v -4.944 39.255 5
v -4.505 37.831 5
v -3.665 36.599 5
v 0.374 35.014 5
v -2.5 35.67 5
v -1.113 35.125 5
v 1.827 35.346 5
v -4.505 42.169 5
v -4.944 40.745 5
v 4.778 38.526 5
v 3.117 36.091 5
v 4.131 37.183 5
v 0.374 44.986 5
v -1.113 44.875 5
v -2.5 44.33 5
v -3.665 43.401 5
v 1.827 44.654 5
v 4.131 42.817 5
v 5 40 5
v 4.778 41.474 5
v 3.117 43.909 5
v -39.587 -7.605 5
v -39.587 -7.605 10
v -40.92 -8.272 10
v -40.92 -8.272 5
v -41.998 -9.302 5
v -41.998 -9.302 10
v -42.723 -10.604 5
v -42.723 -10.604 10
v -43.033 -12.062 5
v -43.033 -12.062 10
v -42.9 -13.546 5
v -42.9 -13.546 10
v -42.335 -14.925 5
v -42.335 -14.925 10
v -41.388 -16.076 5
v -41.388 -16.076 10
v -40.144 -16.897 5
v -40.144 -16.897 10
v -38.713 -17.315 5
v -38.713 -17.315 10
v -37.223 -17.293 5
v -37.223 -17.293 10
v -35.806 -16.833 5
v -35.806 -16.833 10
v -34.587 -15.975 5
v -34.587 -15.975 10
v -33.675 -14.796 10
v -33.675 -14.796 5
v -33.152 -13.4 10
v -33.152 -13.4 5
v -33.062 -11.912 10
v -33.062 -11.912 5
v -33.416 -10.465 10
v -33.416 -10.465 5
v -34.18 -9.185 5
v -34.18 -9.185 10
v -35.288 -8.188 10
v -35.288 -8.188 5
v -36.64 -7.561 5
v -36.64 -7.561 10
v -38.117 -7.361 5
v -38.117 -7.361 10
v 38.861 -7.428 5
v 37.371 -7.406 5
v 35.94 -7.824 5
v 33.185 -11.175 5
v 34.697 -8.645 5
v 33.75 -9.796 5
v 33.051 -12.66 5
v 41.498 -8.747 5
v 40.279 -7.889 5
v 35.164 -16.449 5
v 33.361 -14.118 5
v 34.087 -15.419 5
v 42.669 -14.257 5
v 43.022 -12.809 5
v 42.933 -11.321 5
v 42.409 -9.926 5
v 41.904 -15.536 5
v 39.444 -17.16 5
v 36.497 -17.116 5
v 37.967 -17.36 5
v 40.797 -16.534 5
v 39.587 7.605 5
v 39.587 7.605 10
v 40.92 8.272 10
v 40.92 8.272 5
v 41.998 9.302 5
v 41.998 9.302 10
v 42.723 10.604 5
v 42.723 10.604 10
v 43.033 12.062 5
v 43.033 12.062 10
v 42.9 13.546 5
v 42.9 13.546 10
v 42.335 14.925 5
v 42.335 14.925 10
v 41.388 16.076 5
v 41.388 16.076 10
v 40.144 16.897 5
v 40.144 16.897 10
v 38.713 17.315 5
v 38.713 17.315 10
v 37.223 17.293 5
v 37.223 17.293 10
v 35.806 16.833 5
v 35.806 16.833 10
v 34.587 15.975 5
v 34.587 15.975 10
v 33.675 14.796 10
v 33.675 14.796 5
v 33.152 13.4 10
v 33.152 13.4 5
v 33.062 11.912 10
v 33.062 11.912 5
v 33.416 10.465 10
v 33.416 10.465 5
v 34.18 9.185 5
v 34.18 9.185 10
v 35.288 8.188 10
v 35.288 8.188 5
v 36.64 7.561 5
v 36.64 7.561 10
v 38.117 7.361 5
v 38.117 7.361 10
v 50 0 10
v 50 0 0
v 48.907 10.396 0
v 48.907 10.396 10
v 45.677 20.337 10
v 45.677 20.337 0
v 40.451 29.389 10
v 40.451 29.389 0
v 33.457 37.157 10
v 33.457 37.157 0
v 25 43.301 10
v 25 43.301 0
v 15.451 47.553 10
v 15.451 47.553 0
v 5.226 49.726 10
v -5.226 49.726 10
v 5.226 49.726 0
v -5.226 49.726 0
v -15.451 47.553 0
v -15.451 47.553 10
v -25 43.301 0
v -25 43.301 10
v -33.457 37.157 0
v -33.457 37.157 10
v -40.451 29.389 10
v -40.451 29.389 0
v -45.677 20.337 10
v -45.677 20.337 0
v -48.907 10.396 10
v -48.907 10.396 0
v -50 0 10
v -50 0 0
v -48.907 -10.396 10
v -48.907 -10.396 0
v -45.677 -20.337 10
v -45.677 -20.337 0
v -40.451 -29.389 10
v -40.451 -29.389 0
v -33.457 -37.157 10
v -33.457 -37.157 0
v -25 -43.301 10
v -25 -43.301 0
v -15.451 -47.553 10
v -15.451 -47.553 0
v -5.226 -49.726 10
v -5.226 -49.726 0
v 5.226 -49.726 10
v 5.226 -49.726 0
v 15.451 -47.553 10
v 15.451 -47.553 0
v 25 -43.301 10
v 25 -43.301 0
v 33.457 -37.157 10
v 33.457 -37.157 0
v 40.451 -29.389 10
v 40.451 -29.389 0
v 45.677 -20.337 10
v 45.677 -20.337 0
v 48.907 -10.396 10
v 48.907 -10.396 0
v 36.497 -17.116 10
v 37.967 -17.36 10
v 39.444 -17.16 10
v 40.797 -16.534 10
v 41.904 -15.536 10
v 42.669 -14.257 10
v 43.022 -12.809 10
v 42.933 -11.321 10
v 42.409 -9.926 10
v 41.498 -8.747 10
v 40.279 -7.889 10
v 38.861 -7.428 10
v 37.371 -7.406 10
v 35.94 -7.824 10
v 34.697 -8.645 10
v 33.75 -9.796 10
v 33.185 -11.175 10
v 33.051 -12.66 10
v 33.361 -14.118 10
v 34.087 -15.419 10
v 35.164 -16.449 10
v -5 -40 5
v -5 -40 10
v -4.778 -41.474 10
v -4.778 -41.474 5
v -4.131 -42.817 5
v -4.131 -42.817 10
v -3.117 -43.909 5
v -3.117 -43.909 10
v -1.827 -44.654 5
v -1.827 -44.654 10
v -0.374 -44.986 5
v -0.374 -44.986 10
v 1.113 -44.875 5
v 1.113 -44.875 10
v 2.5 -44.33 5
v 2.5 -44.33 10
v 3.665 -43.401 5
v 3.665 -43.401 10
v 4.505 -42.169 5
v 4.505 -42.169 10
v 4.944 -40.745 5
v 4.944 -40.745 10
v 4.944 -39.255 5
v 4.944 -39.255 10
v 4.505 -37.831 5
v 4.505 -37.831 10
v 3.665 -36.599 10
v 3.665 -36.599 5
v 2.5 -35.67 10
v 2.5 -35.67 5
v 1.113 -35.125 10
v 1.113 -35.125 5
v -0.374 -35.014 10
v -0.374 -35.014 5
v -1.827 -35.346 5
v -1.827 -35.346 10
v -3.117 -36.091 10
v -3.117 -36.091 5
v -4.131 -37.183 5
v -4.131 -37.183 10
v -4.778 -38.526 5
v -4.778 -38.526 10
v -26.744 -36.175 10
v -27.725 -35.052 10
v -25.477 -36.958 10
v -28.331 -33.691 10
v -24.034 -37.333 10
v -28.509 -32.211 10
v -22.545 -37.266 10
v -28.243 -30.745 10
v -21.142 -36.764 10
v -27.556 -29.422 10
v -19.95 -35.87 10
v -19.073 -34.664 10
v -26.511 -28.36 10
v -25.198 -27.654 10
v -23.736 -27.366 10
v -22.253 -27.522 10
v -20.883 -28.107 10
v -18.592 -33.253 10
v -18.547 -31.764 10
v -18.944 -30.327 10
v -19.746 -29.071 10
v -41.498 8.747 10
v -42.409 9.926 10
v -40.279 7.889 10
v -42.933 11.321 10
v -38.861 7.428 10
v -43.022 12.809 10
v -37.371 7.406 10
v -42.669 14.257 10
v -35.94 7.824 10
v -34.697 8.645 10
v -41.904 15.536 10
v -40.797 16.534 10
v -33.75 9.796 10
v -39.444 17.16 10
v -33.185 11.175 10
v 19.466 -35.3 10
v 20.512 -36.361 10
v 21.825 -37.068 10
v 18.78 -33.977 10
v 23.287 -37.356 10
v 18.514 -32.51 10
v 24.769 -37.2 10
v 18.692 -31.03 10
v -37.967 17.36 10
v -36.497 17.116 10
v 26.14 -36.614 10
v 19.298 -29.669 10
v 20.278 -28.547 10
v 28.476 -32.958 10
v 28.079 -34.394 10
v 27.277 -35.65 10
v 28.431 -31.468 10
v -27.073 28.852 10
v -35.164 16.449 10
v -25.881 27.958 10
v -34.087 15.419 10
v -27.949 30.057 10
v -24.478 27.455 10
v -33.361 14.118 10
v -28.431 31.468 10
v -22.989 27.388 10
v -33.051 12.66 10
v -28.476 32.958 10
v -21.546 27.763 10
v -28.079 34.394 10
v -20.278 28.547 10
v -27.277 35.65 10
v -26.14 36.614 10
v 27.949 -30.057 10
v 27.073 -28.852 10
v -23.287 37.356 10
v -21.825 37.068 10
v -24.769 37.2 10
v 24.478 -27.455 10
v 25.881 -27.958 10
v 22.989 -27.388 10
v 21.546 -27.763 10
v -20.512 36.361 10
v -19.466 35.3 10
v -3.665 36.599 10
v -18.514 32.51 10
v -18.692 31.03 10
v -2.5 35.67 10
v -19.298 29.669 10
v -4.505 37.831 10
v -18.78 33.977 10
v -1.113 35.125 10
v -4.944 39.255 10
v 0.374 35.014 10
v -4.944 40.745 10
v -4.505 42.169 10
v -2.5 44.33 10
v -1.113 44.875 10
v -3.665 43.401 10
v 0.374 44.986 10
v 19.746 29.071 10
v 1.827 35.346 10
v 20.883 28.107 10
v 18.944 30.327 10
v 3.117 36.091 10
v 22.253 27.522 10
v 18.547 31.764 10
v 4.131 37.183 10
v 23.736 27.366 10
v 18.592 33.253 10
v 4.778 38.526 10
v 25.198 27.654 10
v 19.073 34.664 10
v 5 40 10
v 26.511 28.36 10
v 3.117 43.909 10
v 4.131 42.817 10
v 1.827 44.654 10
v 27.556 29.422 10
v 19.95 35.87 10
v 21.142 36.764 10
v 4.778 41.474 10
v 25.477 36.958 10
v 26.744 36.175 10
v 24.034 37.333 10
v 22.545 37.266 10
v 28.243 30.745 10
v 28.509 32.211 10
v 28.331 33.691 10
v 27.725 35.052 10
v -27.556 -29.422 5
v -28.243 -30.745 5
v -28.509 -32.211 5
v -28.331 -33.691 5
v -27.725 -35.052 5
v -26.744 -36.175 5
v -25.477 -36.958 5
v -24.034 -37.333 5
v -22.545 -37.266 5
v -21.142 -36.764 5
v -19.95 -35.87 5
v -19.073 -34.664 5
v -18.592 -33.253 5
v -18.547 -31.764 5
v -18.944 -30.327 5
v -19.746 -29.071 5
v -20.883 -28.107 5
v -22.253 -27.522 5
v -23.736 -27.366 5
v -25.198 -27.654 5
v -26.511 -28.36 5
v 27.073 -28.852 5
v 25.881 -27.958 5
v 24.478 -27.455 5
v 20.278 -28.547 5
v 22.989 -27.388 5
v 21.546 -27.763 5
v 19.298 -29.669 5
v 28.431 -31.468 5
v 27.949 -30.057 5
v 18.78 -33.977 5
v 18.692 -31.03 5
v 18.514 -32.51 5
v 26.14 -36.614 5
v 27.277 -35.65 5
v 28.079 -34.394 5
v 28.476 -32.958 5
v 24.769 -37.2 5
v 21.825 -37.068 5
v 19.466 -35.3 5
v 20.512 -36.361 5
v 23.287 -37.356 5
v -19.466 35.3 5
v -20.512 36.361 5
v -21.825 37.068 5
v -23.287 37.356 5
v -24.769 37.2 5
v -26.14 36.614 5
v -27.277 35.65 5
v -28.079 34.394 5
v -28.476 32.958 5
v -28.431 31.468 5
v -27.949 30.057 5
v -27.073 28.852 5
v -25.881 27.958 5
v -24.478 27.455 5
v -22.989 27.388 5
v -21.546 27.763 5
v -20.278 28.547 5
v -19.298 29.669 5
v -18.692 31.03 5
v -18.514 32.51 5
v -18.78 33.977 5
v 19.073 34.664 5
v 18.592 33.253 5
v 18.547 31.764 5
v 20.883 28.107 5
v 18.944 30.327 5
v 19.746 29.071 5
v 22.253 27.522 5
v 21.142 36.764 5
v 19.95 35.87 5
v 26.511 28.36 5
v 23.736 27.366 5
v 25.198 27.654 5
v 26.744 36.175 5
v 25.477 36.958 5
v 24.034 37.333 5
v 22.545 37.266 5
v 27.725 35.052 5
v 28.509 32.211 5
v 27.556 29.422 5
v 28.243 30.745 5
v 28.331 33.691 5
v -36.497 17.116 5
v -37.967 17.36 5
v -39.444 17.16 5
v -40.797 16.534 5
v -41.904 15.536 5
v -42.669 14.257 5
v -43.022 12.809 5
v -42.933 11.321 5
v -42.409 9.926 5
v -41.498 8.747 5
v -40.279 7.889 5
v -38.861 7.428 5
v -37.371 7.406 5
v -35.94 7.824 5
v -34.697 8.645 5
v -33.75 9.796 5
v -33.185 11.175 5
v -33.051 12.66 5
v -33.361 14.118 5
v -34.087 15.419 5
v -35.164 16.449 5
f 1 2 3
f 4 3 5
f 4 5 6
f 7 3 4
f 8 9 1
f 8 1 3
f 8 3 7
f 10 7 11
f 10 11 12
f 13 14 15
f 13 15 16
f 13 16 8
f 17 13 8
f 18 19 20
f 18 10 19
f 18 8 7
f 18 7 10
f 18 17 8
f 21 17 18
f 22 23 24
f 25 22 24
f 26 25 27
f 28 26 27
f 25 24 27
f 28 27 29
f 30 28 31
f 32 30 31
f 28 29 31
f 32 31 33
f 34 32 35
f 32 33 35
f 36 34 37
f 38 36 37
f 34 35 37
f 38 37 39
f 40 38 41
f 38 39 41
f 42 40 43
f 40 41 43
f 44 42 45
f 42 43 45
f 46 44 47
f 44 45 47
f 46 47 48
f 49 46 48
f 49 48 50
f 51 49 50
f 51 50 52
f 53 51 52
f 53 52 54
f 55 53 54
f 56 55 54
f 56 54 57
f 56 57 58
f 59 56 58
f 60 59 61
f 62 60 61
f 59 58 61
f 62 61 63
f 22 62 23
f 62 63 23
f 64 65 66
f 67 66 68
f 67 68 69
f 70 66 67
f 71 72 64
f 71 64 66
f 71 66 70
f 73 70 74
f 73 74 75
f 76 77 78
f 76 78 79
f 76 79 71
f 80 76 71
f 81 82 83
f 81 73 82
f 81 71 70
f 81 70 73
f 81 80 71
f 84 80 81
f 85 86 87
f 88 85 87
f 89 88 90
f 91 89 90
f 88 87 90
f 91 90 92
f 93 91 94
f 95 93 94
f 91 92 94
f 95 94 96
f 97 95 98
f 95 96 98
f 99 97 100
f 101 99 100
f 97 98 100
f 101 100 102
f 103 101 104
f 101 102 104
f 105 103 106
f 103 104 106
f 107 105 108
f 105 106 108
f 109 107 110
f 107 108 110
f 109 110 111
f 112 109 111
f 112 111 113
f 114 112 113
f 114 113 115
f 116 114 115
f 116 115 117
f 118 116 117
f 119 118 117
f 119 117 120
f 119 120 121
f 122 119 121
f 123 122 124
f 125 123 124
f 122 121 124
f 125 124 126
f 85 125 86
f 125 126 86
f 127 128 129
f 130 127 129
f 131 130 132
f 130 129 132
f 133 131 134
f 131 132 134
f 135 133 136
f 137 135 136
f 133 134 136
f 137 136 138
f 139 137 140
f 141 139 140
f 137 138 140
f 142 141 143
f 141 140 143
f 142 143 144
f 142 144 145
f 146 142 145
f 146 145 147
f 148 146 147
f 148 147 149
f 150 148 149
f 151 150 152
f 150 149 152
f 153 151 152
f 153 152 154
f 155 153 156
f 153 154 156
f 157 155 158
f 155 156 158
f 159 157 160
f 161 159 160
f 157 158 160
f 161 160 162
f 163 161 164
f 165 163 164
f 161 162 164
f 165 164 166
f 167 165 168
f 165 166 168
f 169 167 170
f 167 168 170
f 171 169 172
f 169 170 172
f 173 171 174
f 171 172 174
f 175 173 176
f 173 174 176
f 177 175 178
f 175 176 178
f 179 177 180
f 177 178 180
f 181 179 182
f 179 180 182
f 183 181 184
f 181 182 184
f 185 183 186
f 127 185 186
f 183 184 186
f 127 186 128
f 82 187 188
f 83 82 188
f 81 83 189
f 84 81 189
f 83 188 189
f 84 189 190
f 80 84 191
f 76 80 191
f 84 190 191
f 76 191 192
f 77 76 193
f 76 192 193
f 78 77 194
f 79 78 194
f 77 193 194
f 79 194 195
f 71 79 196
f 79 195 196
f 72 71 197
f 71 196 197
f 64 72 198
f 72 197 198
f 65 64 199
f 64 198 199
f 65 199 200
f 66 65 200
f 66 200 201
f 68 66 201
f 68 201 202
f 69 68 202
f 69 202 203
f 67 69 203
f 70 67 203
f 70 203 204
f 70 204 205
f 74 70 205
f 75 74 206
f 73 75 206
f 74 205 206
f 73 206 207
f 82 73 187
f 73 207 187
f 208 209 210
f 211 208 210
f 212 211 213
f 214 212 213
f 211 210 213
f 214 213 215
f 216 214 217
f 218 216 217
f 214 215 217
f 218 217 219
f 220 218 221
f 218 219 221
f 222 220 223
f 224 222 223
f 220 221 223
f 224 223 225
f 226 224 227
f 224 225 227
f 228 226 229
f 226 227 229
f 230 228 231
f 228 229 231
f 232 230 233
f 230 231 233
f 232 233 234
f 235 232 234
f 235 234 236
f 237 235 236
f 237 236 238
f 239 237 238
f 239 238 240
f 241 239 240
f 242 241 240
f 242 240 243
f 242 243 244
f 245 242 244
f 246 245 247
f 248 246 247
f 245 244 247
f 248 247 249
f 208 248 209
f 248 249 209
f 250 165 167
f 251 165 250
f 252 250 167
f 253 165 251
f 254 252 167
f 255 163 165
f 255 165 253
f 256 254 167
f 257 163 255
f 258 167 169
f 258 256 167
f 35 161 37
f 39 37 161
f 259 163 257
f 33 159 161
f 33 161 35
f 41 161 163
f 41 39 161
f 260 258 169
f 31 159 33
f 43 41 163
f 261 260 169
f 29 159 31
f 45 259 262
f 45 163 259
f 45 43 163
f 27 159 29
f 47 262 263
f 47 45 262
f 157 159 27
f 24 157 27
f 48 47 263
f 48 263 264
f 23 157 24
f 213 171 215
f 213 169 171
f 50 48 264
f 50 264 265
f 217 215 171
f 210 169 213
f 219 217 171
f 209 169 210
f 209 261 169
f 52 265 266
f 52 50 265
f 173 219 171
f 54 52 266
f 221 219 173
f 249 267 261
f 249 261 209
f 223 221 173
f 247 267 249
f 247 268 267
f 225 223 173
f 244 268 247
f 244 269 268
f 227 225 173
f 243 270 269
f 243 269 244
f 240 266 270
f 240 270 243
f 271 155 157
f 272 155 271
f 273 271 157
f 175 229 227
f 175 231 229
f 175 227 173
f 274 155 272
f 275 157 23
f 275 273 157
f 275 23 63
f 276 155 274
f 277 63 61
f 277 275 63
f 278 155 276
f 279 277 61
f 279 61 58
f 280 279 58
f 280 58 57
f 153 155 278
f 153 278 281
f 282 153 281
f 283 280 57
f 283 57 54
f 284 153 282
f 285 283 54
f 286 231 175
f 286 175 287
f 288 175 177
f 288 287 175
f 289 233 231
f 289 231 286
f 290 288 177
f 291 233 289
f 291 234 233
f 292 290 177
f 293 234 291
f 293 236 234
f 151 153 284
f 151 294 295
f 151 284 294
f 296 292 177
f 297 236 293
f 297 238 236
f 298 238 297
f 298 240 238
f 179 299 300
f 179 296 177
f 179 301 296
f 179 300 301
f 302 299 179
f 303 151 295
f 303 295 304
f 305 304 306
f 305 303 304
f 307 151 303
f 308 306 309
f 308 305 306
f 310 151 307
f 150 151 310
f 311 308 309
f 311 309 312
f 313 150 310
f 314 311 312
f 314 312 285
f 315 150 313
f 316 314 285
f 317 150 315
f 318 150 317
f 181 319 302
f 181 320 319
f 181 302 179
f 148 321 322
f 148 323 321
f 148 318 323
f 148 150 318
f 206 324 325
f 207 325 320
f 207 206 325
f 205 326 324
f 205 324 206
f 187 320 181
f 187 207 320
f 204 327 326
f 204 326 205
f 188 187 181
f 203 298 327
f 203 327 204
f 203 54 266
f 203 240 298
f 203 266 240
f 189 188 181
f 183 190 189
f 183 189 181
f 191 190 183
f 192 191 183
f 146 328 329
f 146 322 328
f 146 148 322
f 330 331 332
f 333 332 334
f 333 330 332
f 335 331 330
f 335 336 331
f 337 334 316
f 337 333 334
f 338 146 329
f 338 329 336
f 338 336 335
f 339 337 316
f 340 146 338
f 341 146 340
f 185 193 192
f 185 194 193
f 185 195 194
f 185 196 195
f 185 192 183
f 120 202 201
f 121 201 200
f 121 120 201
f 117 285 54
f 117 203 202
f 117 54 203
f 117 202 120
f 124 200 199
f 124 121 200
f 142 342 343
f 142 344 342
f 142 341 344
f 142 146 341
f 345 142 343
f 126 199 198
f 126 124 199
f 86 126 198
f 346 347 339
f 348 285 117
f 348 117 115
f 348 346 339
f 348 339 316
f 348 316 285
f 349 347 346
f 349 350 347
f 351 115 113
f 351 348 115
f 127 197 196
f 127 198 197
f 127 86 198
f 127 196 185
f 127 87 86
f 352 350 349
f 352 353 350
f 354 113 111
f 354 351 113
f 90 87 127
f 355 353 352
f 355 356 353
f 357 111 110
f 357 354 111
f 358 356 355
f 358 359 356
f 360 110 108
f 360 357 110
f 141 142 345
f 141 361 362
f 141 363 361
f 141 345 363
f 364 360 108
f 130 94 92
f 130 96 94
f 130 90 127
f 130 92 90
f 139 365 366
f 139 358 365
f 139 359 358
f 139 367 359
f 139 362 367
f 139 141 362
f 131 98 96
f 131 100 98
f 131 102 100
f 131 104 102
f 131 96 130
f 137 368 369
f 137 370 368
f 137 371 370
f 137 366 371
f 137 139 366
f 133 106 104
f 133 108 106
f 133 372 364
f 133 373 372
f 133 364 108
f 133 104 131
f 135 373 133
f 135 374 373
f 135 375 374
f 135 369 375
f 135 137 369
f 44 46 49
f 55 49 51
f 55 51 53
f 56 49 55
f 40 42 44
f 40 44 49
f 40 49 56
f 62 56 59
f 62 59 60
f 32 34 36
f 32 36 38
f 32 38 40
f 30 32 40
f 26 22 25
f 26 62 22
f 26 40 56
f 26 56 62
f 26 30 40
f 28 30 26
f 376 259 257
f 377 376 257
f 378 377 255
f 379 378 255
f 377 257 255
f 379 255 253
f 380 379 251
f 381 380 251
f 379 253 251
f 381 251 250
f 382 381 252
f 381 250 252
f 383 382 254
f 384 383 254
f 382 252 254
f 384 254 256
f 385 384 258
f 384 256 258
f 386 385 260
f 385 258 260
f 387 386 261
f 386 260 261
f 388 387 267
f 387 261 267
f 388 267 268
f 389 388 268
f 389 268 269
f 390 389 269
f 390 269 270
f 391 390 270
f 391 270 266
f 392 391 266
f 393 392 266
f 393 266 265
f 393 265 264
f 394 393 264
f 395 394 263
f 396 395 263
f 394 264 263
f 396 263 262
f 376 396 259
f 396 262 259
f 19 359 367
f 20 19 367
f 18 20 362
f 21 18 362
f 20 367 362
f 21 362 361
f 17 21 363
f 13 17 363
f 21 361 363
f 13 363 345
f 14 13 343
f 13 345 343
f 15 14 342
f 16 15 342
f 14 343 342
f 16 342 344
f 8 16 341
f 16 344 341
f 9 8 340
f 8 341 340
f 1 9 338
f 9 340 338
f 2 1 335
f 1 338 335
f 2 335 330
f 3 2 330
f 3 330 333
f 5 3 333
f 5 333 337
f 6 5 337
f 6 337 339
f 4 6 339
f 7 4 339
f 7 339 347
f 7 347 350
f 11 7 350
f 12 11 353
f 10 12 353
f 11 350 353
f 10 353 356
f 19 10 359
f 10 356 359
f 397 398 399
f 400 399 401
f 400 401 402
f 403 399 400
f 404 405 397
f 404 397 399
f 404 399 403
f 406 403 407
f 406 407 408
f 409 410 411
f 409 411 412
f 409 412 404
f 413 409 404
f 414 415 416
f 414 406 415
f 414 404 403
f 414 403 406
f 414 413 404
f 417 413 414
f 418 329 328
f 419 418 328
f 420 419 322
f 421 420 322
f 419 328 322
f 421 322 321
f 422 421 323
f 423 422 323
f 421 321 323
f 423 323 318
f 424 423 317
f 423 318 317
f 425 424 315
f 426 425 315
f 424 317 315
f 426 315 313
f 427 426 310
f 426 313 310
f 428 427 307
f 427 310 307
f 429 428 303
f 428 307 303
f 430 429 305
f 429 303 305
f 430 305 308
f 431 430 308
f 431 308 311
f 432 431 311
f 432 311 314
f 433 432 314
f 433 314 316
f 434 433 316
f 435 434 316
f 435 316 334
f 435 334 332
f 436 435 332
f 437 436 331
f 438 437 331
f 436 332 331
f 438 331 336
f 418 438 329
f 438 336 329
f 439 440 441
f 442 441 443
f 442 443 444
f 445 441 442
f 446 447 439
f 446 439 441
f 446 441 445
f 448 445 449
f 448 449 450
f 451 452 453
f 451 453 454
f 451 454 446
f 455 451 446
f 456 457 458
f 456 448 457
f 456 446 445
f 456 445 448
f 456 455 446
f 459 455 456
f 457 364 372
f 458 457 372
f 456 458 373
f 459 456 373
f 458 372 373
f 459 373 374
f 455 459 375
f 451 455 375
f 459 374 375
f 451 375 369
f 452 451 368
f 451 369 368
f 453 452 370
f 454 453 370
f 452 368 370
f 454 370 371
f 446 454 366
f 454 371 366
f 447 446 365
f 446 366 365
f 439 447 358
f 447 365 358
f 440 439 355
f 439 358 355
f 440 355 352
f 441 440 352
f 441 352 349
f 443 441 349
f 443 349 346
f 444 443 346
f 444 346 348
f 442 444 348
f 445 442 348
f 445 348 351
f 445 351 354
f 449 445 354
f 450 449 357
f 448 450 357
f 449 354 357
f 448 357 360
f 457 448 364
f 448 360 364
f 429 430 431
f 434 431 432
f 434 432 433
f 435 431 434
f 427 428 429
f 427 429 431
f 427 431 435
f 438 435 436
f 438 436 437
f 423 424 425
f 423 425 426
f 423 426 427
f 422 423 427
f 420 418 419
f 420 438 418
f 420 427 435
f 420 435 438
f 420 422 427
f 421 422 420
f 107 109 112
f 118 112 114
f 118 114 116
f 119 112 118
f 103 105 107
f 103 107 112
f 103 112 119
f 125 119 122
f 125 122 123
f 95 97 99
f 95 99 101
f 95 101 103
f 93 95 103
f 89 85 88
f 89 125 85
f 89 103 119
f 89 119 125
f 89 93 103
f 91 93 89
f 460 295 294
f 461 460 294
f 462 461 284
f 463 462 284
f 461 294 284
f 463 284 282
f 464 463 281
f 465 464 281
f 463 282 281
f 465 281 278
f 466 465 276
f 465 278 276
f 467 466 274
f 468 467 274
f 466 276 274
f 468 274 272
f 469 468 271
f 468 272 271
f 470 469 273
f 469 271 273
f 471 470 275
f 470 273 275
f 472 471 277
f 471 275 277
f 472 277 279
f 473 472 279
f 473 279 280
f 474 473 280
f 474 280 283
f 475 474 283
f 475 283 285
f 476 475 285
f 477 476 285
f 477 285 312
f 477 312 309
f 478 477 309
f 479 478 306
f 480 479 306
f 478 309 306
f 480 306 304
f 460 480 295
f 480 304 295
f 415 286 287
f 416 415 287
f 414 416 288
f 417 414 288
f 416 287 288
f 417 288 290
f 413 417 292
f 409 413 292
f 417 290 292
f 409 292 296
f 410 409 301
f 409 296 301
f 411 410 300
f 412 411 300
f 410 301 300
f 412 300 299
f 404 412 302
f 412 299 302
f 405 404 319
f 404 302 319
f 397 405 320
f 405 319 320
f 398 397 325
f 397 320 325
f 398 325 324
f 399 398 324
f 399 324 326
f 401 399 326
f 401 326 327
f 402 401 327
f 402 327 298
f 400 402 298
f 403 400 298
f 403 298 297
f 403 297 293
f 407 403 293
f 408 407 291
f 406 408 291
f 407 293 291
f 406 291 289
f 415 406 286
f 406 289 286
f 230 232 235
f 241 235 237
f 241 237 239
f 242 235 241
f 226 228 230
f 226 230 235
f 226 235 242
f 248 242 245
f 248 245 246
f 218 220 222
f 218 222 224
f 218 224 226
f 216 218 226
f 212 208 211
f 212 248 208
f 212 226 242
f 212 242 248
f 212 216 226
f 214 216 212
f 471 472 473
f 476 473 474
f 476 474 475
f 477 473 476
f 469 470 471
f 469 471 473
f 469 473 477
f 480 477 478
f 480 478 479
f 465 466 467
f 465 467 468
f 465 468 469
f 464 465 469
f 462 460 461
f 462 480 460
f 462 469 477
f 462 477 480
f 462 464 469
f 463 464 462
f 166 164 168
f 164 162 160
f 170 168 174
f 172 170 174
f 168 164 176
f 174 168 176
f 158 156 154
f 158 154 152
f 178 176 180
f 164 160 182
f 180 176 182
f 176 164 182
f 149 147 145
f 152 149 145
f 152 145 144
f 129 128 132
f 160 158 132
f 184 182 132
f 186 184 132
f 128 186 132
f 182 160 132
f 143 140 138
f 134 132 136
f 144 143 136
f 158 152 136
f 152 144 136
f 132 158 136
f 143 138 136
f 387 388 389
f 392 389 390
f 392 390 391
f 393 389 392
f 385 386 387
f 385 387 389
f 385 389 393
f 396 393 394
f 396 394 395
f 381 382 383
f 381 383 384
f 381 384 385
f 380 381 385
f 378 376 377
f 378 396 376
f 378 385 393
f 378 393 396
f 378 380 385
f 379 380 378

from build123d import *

# Parameters (mm, degrees)
SKETCH_R           = 50
PAD_DEPTH          = 10
SKETCH001_R        = 5
POCKET_DEPTH       = 5
POLARPATTERN_COUNT = 10


with BuildPart() as part:
    # Sketch → Pad (new body)
    with BuildSketch(Plane.XY):
        Circle(SKETCH_R)
    extrude(amount=PAD_DEPTH)

    # Sketch001 (on Face3 of Pad) → Pocket (cut)
    with BuildSketch(Plane.XY.offset(10)):
        with Locations((0, 40)):
            Circle(SKETCH001_R)
    pocket = extrude(amount=-POCKET_DEPTH, mode=Mode.SUBTRACT)

    # PolarPattern: Pocket ×10 about axis
    polarpattern_axis = Axis((0, 0, 0), (0, 0, 1))
    for i in range(1, POLARPATTERN_COUNT):
        add(pocket.rotate(polarpattern_axis, i * 360 / POLARPATTERN_COUNT), mode=Mode.SUBTRACT)


solid = part.part
